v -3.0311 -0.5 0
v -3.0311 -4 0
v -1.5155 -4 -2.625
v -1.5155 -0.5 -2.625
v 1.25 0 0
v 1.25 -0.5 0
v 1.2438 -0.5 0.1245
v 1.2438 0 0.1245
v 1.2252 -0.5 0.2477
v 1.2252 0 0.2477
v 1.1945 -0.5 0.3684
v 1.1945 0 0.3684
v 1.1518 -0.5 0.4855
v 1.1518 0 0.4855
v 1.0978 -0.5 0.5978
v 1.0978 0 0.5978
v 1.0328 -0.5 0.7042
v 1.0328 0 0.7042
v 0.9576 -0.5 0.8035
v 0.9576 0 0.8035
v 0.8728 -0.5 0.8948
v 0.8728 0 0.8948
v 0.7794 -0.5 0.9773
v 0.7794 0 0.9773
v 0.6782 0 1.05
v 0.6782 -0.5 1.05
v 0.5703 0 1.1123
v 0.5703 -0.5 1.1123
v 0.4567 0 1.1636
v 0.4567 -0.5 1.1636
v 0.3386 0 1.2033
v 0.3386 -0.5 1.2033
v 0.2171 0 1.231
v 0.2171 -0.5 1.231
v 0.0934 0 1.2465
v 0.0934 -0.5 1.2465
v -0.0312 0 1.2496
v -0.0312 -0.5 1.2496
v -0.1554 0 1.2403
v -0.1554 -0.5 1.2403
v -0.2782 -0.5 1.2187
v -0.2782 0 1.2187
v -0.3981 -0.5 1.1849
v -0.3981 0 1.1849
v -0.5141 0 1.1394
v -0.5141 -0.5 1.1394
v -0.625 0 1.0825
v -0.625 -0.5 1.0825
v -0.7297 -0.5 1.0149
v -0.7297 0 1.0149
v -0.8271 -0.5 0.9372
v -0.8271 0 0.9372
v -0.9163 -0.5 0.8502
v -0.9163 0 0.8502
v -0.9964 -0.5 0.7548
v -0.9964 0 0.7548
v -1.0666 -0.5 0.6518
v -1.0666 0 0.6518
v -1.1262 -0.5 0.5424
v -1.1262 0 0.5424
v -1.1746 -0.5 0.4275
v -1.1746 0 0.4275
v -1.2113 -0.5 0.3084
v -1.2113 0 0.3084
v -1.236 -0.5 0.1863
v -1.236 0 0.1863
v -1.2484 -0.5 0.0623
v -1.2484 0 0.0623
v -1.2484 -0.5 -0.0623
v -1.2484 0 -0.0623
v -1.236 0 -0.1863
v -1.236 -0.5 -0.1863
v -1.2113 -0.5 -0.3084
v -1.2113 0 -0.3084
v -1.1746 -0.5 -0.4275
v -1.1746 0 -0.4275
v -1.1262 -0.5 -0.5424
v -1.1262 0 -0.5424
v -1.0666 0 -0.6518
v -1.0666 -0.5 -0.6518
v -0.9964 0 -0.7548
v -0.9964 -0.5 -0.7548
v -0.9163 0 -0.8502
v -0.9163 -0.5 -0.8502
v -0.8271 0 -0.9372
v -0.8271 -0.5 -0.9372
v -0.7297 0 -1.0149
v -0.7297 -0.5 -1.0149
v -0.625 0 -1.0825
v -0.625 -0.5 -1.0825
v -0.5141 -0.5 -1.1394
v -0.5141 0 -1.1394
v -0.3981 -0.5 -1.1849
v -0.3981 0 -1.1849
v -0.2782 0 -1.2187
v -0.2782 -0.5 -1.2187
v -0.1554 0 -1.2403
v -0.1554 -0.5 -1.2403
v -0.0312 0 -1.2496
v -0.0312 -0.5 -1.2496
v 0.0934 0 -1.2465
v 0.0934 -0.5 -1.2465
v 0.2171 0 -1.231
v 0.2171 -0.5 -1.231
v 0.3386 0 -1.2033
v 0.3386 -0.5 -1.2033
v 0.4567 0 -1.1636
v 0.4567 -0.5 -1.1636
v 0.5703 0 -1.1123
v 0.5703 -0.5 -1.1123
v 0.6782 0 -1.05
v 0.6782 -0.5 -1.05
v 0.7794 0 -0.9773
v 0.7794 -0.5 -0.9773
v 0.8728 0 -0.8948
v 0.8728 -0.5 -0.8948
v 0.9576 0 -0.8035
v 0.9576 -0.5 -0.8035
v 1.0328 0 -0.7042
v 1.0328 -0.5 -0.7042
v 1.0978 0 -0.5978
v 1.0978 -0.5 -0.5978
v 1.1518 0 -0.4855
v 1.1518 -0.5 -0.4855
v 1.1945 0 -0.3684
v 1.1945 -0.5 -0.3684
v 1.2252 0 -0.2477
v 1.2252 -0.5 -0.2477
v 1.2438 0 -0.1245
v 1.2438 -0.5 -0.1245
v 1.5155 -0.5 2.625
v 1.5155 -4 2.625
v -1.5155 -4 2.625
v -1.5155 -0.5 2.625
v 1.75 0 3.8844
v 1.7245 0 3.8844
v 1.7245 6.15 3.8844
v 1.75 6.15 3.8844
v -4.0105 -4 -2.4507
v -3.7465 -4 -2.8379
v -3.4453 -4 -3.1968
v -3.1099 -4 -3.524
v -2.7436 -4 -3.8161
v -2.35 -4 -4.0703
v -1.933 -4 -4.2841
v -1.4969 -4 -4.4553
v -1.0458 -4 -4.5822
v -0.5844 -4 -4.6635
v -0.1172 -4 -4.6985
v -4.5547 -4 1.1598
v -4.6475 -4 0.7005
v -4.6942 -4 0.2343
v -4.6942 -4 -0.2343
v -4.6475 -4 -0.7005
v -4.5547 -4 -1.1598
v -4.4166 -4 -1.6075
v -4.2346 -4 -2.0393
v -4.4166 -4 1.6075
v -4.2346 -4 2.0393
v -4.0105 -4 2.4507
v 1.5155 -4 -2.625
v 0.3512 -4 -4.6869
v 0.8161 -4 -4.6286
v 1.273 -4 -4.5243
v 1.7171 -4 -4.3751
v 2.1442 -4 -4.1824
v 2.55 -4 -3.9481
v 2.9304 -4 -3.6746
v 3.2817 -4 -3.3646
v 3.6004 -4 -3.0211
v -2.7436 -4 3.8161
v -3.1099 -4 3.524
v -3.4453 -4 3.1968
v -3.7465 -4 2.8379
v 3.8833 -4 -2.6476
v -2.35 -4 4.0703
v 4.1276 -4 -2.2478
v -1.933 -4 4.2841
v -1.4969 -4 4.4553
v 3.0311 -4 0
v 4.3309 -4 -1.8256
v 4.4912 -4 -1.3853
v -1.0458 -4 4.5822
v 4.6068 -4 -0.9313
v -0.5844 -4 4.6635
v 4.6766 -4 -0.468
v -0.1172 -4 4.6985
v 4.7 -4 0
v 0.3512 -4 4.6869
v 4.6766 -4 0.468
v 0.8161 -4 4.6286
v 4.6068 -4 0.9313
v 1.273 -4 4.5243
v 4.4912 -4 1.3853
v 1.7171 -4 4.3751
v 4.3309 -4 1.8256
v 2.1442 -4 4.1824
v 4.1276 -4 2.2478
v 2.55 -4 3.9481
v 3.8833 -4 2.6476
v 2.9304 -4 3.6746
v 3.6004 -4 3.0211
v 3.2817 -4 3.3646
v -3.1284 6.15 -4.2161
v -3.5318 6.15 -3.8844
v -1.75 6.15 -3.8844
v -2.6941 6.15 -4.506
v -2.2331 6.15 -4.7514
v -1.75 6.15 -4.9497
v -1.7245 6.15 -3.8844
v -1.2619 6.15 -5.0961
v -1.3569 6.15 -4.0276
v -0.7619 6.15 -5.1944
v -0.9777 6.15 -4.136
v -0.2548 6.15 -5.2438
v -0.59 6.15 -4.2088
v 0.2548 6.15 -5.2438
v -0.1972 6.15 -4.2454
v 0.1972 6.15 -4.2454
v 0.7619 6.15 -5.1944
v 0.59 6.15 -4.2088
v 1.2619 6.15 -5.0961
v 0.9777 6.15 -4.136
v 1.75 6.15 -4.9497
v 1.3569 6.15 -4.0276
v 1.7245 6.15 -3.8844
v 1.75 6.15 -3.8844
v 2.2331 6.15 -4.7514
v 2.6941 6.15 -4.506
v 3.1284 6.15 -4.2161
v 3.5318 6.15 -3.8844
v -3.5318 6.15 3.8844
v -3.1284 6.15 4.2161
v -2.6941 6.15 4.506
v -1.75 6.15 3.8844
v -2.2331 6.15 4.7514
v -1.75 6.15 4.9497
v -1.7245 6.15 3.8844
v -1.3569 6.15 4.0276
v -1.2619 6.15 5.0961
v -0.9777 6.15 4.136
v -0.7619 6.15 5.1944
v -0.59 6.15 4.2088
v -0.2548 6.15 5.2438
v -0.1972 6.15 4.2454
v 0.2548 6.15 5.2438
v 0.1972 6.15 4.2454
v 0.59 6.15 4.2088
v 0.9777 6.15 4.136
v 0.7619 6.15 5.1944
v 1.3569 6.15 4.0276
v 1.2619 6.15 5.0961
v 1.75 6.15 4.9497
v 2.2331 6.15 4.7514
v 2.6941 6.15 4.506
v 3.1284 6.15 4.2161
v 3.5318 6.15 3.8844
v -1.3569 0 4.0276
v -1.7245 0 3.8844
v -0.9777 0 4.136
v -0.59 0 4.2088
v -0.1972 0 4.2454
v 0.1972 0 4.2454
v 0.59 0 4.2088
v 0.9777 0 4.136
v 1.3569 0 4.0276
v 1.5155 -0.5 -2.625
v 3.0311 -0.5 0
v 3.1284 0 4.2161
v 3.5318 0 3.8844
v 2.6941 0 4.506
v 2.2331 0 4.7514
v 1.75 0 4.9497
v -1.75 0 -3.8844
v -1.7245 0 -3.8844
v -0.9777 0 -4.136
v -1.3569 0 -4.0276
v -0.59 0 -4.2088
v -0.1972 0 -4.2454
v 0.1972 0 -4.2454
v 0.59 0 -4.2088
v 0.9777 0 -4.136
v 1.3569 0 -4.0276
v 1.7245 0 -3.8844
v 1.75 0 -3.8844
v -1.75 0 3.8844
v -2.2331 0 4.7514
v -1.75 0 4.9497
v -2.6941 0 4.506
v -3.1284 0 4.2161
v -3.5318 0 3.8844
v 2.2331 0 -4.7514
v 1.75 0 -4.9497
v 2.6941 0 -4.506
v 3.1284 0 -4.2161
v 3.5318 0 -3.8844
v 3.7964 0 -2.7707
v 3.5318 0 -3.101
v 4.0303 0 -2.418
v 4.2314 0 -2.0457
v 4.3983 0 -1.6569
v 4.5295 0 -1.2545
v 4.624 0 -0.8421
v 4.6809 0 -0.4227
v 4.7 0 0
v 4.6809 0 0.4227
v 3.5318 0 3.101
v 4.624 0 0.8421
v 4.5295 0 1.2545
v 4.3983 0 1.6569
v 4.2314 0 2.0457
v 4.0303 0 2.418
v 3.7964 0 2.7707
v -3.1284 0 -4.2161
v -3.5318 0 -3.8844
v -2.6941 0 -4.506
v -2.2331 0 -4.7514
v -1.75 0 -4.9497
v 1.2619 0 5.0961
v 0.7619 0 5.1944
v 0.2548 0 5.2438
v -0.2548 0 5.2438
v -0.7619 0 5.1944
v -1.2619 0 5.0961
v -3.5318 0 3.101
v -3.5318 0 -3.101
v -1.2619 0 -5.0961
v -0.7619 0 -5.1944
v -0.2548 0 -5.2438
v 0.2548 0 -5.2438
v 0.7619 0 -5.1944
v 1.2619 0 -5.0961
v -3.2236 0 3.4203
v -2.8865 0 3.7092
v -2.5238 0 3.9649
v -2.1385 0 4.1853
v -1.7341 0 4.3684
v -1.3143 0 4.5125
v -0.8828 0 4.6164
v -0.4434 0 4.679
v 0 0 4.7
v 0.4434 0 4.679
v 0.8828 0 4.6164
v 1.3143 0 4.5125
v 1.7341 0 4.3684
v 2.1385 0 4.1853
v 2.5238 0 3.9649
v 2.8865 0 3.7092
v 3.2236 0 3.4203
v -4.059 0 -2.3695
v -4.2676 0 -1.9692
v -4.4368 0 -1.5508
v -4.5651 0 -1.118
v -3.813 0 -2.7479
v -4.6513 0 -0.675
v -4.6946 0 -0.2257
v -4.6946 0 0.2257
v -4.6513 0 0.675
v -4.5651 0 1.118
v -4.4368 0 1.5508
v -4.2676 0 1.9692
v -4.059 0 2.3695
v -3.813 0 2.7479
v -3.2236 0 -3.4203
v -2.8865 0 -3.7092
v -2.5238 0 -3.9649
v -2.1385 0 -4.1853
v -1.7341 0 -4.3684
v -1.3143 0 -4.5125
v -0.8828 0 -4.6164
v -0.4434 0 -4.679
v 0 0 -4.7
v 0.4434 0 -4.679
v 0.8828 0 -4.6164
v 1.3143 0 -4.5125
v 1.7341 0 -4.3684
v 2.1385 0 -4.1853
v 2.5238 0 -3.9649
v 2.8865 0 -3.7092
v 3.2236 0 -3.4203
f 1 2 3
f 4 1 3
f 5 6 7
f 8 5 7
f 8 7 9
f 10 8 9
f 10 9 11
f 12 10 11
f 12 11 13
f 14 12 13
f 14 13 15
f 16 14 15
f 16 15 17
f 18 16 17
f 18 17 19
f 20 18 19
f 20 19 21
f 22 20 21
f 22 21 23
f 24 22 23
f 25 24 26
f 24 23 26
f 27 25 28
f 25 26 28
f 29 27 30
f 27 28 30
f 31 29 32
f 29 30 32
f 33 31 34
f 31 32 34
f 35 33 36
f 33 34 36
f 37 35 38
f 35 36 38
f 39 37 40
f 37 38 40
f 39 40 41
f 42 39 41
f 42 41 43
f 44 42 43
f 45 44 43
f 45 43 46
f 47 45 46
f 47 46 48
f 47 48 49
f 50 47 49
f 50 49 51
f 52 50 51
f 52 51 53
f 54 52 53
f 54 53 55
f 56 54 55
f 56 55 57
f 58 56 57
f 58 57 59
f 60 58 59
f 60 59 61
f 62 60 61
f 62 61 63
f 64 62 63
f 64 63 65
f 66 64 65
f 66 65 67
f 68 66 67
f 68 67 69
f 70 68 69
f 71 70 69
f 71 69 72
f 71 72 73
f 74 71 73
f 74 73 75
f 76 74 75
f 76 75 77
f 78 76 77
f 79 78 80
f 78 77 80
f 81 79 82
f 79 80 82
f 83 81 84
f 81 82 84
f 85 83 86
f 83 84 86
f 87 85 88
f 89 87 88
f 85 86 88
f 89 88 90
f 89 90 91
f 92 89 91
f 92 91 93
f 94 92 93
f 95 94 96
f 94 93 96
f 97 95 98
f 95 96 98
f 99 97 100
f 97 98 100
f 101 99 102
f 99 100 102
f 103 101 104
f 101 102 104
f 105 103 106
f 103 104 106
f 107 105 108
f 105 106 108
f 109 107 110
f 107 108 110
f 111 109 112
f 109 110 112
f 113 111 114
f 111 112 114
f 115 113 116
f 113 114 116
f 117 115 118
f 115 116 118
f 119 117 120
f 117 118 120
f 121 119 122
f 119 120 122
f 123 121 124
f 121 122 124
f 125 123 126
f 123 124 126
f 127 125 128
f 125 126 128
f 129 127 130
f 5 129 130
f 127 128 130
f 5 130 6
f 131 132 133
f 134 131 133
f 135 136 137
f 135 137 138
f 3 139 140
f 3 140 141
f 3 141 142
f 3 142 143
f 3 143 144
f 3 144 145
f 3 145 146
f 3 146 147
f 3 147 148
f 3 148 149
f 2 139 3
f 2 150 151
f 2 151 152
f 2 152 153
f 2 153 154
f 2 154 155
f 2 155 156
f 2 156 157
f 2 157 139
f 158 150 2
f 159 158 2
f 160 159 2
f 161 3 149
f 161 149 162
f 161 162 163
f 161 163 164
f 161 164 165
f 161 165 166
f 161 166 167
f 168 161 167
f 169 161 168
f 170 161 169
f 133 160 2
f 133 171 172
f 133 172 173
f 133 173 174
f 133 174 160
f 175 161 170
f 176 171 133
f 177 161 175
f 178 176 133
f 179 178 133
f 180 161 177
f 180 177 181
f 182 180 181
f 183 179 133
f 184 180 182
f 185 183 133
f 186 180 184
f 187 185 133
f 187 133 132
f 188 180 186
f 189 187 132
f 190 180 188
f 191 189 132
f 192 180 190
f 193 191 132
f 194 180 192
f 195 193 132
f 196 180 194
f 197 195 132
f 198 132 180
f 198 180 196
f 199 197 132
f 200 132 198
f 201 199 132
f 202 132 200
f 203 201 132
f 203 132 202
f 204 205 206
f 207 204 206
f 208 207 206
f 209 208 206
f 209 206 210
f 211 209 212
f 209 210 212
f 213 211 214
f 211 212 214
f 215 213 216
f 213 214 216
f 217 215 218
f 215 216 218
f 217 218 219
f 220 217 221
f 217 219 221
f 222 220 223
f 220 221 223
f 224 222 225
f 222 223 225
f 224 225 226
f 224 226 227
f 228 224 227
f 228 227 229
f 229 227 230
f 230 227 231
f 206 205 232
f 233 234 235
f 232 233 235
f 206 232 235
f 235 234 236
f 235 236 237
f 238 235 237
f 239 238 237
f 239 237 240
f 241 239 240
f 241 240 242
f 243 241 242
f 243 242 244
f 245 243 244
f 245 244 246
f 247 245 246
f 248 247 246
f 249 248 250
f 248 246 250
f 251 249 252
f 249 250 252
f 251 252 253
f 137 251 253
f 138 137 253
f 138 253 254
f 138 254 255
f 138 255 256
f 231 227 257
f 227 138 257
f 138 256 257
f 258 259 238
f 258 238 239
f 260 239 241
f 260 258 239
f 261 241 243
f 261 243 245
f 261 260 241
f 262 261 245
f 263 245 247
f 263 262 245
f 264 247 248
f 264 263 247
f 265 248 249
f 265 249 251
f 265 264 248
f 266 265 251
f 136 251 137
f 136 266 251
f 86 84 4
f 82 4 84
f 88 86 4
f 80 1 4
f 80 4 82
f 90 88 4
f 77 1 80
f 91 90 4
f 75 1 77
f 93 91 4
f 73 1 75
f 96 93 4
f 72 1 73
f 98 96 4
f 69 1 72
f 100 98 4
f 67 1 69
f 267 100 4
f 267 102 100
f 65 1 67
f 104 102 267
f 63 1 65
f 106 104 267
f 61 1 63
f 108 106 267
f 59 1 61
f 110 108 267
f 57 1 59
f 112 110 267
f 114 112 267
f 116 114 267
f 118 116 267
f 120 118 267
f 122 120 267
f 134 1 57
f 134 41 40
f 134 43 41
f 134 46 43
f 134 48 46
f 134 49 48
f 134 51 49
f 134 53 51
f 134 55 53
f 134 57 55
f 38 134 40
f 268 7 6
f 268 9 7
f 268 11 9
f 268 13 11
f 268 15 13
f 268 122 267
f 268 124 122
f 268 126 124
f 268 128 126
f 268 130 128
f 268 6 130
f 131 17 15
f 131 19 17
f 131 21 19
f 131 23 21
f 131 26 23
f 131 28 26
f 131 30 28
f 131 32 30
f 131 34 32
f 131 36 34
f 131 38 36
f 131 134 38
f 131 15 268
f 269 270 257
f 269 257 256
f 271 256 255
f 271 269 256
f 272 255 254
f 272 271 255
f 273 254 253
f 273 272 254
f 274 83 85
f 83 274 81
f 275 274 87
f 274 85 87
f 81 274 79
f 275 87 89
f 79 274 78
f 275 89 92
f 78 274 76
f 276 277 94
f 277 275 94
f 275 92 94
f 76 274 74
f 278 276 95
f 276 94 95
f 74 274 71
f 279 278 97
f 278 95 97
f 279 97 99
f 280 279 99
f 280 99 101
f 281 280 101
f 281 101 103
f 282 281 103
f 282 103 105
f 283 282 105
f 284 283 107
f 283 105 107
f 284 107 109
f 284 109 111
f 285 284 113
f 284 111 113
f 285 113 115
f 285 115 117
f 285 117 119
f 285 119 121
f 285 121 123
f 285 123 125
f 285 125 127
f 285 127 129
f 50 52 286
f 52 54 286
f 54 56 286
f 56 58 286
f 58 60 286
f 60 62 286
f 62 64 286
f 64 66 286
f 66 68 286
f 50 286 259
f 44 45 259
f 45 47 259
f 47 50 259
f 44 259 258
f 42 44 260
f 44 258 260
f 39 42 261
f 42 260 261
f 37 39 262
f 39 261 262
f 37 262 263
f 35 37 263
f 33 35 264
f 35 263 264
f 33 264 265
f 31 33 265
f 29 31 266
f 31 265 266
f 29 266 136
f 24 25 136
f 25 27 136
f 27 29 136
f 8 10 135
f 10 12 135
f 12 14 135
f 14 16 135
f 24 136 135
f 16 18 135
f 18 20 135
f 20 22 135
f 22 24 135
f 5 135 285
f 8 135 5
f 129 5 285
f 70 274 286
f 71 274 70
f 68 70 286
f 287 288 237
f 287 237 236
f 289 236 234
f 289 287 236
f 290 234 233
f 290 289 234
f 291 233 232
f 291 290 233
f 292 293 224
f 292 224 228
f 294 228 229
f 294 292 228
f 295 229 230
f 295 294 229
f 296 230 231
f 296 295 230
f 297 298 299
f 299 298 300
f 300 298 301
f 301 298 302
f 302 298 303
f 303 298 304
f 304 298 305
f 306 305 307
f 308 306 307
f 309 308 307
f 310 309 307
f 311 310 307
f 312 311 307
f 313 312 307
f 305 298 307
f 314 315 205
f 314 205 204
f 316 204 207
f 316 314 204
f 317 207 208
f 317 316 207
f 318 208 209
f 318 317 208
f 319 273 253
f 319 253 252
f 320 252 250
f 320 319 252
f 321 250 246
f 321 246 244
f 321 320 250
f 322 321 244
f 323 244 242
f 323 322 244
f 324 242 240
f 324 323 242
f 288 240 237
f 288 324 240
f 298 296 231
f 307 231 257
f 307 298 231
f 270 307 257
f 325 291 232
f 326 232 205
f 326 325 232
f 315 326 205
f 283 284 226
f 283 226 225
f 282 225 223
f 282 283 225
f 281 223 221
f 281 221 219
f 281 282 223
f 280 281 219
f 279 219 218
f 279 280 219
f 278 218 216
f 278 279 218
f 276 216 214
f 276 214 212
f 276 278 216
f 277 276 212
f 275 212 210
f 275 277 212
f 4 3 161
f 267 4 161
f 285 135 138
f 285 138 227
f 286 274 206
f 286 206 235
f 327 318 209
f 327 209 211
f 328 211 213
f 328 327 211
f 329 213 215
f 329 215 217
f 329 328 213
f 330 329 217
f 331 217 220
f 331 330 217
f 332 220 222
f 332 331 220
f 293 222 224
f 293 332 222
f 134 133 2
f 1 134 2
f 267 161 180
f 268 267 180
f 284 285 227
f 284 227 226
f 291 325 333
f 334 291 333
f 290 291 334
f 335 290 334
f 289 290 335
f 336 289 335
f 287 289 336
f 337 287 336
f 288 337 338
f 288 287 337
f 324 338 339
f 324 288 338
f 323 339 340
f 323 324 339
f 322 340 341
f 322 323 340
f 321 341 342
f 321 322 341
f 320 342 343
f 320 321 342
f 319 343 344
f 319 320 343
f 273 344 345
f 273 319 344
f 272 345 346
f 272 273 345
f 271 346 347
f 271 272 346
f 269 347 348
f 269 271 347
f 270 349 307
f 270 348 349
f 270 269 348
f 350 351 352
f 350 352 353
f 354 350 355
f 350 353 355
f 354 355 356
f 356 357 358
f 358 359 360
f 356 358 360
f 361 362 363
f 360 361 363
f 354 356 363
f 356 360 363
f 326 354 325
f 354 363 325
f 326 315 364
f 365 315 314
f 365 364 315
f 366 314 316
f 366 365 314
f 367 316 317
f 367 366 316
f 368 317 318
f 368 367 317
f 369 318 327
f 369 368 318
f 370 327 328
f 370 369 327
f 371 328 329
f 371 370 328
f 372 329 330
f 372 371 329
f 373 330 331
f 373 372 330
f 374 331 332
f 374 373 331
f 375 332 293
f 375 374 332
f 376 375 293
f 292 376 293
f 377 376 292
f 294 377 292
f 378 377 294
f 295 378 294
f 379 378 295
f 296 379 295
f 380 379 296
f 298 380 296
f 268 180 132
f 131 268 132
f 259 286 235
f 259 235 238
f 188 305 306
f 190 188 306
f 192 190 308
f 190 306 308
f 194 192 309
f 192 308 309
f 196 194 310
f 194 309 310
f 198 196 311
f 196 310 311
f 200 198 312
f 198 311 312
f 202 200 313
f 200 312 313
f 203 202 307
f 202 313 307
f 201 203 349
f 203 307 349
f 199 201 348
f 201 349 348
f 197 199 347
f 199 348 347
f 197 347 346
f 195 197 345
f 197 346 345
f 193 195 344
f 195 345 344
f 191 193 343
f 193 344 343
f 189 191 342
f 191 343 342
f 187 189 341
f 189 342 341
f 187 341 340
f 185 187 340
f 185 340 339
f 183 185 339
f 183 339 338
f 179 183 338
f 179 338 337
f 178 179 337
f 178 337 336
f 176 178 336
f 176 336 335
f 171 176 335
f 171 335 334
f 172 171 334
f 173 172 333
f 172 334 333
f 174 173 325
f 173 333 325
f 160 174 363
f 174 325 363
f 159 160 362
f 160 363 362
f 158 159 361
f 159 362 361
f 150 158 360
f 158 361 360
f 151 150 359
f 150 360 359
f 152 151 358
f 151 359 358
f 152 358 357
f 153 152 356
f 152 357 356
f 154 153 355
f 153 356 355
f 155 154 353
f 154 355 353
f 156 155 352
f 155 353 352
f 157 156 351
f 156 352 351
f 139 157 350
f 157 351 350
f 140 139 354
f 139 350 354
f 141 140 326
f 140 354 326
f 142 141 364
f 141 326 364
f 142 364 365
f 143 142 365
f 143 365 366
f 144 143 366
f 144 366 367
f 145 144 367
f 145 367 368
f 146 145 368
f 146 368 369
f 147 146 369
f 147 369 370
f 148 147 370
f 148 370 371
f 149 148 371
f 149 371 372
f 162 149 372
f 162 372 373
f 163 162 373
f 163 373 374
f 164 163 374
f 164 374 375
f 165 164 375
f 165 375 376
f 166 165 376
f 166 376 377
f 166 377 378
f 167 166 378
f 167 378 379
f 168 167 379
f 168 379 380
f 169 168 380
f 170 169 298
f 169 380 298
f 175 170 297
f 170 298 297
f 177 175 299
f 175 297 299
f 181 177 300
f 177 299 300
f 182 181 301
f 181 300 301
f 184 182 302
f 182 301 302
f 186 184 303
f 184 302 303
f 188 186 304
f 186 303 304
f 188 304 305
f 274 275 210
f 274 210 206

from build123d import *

# Parameters (mm, degrees)
F1_DEPTH = 6.15
F2_R     = 4.7
F3_DEPTH = 4
F6_DEPTH = 3.5
F7_R     = 1.25
F8_DEPTH = 5


with BuildPart() as f1:
    # F0 (on Front) → F1 (new body)
    with BuildSketch(Plane.XZ):
        with BuildLine():
            Line((-1.75, 3.88440617), (-1.75, 4.9497474683))
            ThreePointArc((-1.75, 4.9497474683), (-2.6941036669, 4.506029897), (-3.5318392809, 3.88440617))
            Line((-3.5318392809, 3.88440617), (-1.75, 3.88440617))
        make_face()
        with BuildLine():
            Line((-1.75, 3.88440617), (-3.5318392809, 3.88440617))
            Line((-3.5318392809, 3.88440617), (-3.5318392809, 2.3640243852))
            ThreePointArc((-3.5318392809, 2.3640243852), (-2.7465789328, 3.2432705971), (-1.75, 3.8729833462))
            Line((-1.75, 3.8729833462), (-1.75, 3.88440617))
        make_face()
        with BuildLine():
            ThreePointArc((-1.75, 3.8729833462), (-2.7465789328, 3.2432705971), (-3.5318392809, 2.3640243852))
            Line((-3.5318392809, 2.3640243852), (-3.5318392809, -2.3640243852))
            ThreePointArc((-3.5318392809, -2.3640243852), (-2.7465789328, -3.2432705971), (-1.75, -3.8729833462))
            Line((-1.75, -3.8729833462), (-1.75, 3.8729833462))
        make_face()
        with BuildLine():
            Line((-3.5318392809, -2.3640243852), (-3.5318392809, -3.88440617))
            Line((-3.5318392809, -3.88440617), (-1.75, -3.88440617))
            Line((-1.75, -3.88440617), (-1.75, -3.8729833462))
            ThreePointArc((-1.75, -3.8729833462), (-2.7465789328, -3.2432705971), (-3.5318392809, -2.3640243852))
        make_face()
        with BuildLine():
            ThreePointArc((-3.5318392809, -3.88440617), (-2.6941036669, -4.506029897), (-1.75, -4.9497474683))
            Line((-1.75, -4.9497474683), (-1.75, -3.88440617))
            Line((-1.75, -3.88440617), (-3.5318392809, -3.88440617))
        make_face()
        with BuildLine():
            Line((-1.75, -4.9497474683), (1.75, -4.9497474683))
            Line((1.75, -4.9497474683), (1.75, -3.88440617))
            Line((1.75, -3.88440617), (1.724496653, -3.88440617))
            ThreePointArc((1.724496653, -3.88440617), (0, -4.25), (-1.724496653, -3.88440617))
            Line((-1.724496653, -3.88440617), (-1.75, -3.88440617))
            Line((-1.75, -3.88440617), (-1.75, -4.9497474683))
        make_face()
        with BuildLine():
            ThreePointArc((-1.75, -4.9497474683), (0, -5.25), (1.75, -4.9497474683))
            Line((1.75, -4.9497474683), (-1.75, -4.9497474683))
        make_face()
        with BuildLine():
            ThreePointArc((1.75, -4.9497474683), (2.6941036669, -4.506029897), (3.5318392809, -3.88440617))
            Line((3.5318392809, -3.88440617), (1.75, -3.88440617))
            Line((1.75, -3.88440617), (1.75, -4.9497474683))
        make_face()
        with BuildLine():
            Line((1.75, -3.88440617), (3.5318392809, -3.88440617))
            Line((3.5318392809, -3.88440617), (3.5318392809, -2.3640243852))
            ThreePointArc((3.5318392809, -2.3640243852), (2.7465789328, -3.2432705971), (1.75, -3.8729833462))
            Line((1.75, -3.8729833462), (1.75, -3.88440617))
        make_face()
        with BuildLine():
            Line((3.5318392809, -2.3640243852), (3.5318392809, 2.3640243852))
            ThreePointArc((3.5318392809, 2.3640243852), (2.7465789328, 3.2432705971), (1.75, 3.8729833462))
            Line((1.75, 3.8729833462), (1.75, -3.8729833462))
            ThreePointArc((1.75, -3.8729833462), (2.7465789328, -3.2432705971), (3.5318392809, -2.3640243852))
        make_face()
        with BuildLine():
            Line((3.5318392809, 2.3640243852), (3.5318392809, 3.88440617))
            Line((3.5318392809, 3.88440617), (1.75, 3.88440617))
            Line((1.75, 3.88440617), (1.75, 3.8729833462))
            ThreePointArc((1.75, 3.8729833462), (2.7465789328, 3.2432705971), (3.5318392809, 2.3640243852))
        make_face()
        with BuildLine():
            Line((1.75, 3.88440617), (3.5318392809, 3.88440617))
            ThreePointArc((3.5318392809, 3.88440617), (2.6941036669, 4.506029897), (1.75, 4.9497474683))
            Line((1.75, 4.9497474683), (1.75, 3.88440617))
        make_face()
        with BuildLine():
            Line((1.75, 3.88440617), (1.75, 4.9497474683))
            Line((1.75, 4.9497474683), (-1.75, 4.9497474683))
            Line((-1.75, 4.9497474683), (-1.75, 3.88440617))
            Line((-1.75, 3.88440617), (-1.724496653, 3.88440617))
            ThreePointArc((-1.724496653, 3.88440617), (0, 4.25), (1.724496653, 3.88440617))
            Line((1.724496653, 3.88440617), (1.75, 3.88440617))
        make_face()
        with BuildLine():
            Line((-1.75, 4.9497474683), (1.75, 4.9497474683))
            ThreePointArc((1.75, 4.9497474683), (0, 5.25), (-1.75, 4.9497474683))
        make_face()
    extrude(amount=-F1_DEPTH)

    # F2 (on Front) → F3 (join)
    with BuildSketch(Plane.XZ):
        Circle(F2_R)
    extrude(amount=F3_DEPTH)

    # F5 (on offset) → F6 (cut)
    with BuildSketch(Plane.XZ.offset(4)):
        Polygon((-1.5155444566, -2.625), (1.5155444566, -2.625), (3.0310889132, 0), (1.5155444566, 2.625), (-1.5155444566, 2.625), (-3.0310889132, 0), align=None)
    extrude(amount=-F6_DEPTH, mode=Mode.SUBTRACT)

    # F7 (on offset) → F8 (cut)
    with BuildSketch(Plane.XZ.offset(4)):
        Circle(F7_R)
    extrude(amount=-F8_DEPTH, mode=Mode.SUBTRACT)


solid = f1.part
